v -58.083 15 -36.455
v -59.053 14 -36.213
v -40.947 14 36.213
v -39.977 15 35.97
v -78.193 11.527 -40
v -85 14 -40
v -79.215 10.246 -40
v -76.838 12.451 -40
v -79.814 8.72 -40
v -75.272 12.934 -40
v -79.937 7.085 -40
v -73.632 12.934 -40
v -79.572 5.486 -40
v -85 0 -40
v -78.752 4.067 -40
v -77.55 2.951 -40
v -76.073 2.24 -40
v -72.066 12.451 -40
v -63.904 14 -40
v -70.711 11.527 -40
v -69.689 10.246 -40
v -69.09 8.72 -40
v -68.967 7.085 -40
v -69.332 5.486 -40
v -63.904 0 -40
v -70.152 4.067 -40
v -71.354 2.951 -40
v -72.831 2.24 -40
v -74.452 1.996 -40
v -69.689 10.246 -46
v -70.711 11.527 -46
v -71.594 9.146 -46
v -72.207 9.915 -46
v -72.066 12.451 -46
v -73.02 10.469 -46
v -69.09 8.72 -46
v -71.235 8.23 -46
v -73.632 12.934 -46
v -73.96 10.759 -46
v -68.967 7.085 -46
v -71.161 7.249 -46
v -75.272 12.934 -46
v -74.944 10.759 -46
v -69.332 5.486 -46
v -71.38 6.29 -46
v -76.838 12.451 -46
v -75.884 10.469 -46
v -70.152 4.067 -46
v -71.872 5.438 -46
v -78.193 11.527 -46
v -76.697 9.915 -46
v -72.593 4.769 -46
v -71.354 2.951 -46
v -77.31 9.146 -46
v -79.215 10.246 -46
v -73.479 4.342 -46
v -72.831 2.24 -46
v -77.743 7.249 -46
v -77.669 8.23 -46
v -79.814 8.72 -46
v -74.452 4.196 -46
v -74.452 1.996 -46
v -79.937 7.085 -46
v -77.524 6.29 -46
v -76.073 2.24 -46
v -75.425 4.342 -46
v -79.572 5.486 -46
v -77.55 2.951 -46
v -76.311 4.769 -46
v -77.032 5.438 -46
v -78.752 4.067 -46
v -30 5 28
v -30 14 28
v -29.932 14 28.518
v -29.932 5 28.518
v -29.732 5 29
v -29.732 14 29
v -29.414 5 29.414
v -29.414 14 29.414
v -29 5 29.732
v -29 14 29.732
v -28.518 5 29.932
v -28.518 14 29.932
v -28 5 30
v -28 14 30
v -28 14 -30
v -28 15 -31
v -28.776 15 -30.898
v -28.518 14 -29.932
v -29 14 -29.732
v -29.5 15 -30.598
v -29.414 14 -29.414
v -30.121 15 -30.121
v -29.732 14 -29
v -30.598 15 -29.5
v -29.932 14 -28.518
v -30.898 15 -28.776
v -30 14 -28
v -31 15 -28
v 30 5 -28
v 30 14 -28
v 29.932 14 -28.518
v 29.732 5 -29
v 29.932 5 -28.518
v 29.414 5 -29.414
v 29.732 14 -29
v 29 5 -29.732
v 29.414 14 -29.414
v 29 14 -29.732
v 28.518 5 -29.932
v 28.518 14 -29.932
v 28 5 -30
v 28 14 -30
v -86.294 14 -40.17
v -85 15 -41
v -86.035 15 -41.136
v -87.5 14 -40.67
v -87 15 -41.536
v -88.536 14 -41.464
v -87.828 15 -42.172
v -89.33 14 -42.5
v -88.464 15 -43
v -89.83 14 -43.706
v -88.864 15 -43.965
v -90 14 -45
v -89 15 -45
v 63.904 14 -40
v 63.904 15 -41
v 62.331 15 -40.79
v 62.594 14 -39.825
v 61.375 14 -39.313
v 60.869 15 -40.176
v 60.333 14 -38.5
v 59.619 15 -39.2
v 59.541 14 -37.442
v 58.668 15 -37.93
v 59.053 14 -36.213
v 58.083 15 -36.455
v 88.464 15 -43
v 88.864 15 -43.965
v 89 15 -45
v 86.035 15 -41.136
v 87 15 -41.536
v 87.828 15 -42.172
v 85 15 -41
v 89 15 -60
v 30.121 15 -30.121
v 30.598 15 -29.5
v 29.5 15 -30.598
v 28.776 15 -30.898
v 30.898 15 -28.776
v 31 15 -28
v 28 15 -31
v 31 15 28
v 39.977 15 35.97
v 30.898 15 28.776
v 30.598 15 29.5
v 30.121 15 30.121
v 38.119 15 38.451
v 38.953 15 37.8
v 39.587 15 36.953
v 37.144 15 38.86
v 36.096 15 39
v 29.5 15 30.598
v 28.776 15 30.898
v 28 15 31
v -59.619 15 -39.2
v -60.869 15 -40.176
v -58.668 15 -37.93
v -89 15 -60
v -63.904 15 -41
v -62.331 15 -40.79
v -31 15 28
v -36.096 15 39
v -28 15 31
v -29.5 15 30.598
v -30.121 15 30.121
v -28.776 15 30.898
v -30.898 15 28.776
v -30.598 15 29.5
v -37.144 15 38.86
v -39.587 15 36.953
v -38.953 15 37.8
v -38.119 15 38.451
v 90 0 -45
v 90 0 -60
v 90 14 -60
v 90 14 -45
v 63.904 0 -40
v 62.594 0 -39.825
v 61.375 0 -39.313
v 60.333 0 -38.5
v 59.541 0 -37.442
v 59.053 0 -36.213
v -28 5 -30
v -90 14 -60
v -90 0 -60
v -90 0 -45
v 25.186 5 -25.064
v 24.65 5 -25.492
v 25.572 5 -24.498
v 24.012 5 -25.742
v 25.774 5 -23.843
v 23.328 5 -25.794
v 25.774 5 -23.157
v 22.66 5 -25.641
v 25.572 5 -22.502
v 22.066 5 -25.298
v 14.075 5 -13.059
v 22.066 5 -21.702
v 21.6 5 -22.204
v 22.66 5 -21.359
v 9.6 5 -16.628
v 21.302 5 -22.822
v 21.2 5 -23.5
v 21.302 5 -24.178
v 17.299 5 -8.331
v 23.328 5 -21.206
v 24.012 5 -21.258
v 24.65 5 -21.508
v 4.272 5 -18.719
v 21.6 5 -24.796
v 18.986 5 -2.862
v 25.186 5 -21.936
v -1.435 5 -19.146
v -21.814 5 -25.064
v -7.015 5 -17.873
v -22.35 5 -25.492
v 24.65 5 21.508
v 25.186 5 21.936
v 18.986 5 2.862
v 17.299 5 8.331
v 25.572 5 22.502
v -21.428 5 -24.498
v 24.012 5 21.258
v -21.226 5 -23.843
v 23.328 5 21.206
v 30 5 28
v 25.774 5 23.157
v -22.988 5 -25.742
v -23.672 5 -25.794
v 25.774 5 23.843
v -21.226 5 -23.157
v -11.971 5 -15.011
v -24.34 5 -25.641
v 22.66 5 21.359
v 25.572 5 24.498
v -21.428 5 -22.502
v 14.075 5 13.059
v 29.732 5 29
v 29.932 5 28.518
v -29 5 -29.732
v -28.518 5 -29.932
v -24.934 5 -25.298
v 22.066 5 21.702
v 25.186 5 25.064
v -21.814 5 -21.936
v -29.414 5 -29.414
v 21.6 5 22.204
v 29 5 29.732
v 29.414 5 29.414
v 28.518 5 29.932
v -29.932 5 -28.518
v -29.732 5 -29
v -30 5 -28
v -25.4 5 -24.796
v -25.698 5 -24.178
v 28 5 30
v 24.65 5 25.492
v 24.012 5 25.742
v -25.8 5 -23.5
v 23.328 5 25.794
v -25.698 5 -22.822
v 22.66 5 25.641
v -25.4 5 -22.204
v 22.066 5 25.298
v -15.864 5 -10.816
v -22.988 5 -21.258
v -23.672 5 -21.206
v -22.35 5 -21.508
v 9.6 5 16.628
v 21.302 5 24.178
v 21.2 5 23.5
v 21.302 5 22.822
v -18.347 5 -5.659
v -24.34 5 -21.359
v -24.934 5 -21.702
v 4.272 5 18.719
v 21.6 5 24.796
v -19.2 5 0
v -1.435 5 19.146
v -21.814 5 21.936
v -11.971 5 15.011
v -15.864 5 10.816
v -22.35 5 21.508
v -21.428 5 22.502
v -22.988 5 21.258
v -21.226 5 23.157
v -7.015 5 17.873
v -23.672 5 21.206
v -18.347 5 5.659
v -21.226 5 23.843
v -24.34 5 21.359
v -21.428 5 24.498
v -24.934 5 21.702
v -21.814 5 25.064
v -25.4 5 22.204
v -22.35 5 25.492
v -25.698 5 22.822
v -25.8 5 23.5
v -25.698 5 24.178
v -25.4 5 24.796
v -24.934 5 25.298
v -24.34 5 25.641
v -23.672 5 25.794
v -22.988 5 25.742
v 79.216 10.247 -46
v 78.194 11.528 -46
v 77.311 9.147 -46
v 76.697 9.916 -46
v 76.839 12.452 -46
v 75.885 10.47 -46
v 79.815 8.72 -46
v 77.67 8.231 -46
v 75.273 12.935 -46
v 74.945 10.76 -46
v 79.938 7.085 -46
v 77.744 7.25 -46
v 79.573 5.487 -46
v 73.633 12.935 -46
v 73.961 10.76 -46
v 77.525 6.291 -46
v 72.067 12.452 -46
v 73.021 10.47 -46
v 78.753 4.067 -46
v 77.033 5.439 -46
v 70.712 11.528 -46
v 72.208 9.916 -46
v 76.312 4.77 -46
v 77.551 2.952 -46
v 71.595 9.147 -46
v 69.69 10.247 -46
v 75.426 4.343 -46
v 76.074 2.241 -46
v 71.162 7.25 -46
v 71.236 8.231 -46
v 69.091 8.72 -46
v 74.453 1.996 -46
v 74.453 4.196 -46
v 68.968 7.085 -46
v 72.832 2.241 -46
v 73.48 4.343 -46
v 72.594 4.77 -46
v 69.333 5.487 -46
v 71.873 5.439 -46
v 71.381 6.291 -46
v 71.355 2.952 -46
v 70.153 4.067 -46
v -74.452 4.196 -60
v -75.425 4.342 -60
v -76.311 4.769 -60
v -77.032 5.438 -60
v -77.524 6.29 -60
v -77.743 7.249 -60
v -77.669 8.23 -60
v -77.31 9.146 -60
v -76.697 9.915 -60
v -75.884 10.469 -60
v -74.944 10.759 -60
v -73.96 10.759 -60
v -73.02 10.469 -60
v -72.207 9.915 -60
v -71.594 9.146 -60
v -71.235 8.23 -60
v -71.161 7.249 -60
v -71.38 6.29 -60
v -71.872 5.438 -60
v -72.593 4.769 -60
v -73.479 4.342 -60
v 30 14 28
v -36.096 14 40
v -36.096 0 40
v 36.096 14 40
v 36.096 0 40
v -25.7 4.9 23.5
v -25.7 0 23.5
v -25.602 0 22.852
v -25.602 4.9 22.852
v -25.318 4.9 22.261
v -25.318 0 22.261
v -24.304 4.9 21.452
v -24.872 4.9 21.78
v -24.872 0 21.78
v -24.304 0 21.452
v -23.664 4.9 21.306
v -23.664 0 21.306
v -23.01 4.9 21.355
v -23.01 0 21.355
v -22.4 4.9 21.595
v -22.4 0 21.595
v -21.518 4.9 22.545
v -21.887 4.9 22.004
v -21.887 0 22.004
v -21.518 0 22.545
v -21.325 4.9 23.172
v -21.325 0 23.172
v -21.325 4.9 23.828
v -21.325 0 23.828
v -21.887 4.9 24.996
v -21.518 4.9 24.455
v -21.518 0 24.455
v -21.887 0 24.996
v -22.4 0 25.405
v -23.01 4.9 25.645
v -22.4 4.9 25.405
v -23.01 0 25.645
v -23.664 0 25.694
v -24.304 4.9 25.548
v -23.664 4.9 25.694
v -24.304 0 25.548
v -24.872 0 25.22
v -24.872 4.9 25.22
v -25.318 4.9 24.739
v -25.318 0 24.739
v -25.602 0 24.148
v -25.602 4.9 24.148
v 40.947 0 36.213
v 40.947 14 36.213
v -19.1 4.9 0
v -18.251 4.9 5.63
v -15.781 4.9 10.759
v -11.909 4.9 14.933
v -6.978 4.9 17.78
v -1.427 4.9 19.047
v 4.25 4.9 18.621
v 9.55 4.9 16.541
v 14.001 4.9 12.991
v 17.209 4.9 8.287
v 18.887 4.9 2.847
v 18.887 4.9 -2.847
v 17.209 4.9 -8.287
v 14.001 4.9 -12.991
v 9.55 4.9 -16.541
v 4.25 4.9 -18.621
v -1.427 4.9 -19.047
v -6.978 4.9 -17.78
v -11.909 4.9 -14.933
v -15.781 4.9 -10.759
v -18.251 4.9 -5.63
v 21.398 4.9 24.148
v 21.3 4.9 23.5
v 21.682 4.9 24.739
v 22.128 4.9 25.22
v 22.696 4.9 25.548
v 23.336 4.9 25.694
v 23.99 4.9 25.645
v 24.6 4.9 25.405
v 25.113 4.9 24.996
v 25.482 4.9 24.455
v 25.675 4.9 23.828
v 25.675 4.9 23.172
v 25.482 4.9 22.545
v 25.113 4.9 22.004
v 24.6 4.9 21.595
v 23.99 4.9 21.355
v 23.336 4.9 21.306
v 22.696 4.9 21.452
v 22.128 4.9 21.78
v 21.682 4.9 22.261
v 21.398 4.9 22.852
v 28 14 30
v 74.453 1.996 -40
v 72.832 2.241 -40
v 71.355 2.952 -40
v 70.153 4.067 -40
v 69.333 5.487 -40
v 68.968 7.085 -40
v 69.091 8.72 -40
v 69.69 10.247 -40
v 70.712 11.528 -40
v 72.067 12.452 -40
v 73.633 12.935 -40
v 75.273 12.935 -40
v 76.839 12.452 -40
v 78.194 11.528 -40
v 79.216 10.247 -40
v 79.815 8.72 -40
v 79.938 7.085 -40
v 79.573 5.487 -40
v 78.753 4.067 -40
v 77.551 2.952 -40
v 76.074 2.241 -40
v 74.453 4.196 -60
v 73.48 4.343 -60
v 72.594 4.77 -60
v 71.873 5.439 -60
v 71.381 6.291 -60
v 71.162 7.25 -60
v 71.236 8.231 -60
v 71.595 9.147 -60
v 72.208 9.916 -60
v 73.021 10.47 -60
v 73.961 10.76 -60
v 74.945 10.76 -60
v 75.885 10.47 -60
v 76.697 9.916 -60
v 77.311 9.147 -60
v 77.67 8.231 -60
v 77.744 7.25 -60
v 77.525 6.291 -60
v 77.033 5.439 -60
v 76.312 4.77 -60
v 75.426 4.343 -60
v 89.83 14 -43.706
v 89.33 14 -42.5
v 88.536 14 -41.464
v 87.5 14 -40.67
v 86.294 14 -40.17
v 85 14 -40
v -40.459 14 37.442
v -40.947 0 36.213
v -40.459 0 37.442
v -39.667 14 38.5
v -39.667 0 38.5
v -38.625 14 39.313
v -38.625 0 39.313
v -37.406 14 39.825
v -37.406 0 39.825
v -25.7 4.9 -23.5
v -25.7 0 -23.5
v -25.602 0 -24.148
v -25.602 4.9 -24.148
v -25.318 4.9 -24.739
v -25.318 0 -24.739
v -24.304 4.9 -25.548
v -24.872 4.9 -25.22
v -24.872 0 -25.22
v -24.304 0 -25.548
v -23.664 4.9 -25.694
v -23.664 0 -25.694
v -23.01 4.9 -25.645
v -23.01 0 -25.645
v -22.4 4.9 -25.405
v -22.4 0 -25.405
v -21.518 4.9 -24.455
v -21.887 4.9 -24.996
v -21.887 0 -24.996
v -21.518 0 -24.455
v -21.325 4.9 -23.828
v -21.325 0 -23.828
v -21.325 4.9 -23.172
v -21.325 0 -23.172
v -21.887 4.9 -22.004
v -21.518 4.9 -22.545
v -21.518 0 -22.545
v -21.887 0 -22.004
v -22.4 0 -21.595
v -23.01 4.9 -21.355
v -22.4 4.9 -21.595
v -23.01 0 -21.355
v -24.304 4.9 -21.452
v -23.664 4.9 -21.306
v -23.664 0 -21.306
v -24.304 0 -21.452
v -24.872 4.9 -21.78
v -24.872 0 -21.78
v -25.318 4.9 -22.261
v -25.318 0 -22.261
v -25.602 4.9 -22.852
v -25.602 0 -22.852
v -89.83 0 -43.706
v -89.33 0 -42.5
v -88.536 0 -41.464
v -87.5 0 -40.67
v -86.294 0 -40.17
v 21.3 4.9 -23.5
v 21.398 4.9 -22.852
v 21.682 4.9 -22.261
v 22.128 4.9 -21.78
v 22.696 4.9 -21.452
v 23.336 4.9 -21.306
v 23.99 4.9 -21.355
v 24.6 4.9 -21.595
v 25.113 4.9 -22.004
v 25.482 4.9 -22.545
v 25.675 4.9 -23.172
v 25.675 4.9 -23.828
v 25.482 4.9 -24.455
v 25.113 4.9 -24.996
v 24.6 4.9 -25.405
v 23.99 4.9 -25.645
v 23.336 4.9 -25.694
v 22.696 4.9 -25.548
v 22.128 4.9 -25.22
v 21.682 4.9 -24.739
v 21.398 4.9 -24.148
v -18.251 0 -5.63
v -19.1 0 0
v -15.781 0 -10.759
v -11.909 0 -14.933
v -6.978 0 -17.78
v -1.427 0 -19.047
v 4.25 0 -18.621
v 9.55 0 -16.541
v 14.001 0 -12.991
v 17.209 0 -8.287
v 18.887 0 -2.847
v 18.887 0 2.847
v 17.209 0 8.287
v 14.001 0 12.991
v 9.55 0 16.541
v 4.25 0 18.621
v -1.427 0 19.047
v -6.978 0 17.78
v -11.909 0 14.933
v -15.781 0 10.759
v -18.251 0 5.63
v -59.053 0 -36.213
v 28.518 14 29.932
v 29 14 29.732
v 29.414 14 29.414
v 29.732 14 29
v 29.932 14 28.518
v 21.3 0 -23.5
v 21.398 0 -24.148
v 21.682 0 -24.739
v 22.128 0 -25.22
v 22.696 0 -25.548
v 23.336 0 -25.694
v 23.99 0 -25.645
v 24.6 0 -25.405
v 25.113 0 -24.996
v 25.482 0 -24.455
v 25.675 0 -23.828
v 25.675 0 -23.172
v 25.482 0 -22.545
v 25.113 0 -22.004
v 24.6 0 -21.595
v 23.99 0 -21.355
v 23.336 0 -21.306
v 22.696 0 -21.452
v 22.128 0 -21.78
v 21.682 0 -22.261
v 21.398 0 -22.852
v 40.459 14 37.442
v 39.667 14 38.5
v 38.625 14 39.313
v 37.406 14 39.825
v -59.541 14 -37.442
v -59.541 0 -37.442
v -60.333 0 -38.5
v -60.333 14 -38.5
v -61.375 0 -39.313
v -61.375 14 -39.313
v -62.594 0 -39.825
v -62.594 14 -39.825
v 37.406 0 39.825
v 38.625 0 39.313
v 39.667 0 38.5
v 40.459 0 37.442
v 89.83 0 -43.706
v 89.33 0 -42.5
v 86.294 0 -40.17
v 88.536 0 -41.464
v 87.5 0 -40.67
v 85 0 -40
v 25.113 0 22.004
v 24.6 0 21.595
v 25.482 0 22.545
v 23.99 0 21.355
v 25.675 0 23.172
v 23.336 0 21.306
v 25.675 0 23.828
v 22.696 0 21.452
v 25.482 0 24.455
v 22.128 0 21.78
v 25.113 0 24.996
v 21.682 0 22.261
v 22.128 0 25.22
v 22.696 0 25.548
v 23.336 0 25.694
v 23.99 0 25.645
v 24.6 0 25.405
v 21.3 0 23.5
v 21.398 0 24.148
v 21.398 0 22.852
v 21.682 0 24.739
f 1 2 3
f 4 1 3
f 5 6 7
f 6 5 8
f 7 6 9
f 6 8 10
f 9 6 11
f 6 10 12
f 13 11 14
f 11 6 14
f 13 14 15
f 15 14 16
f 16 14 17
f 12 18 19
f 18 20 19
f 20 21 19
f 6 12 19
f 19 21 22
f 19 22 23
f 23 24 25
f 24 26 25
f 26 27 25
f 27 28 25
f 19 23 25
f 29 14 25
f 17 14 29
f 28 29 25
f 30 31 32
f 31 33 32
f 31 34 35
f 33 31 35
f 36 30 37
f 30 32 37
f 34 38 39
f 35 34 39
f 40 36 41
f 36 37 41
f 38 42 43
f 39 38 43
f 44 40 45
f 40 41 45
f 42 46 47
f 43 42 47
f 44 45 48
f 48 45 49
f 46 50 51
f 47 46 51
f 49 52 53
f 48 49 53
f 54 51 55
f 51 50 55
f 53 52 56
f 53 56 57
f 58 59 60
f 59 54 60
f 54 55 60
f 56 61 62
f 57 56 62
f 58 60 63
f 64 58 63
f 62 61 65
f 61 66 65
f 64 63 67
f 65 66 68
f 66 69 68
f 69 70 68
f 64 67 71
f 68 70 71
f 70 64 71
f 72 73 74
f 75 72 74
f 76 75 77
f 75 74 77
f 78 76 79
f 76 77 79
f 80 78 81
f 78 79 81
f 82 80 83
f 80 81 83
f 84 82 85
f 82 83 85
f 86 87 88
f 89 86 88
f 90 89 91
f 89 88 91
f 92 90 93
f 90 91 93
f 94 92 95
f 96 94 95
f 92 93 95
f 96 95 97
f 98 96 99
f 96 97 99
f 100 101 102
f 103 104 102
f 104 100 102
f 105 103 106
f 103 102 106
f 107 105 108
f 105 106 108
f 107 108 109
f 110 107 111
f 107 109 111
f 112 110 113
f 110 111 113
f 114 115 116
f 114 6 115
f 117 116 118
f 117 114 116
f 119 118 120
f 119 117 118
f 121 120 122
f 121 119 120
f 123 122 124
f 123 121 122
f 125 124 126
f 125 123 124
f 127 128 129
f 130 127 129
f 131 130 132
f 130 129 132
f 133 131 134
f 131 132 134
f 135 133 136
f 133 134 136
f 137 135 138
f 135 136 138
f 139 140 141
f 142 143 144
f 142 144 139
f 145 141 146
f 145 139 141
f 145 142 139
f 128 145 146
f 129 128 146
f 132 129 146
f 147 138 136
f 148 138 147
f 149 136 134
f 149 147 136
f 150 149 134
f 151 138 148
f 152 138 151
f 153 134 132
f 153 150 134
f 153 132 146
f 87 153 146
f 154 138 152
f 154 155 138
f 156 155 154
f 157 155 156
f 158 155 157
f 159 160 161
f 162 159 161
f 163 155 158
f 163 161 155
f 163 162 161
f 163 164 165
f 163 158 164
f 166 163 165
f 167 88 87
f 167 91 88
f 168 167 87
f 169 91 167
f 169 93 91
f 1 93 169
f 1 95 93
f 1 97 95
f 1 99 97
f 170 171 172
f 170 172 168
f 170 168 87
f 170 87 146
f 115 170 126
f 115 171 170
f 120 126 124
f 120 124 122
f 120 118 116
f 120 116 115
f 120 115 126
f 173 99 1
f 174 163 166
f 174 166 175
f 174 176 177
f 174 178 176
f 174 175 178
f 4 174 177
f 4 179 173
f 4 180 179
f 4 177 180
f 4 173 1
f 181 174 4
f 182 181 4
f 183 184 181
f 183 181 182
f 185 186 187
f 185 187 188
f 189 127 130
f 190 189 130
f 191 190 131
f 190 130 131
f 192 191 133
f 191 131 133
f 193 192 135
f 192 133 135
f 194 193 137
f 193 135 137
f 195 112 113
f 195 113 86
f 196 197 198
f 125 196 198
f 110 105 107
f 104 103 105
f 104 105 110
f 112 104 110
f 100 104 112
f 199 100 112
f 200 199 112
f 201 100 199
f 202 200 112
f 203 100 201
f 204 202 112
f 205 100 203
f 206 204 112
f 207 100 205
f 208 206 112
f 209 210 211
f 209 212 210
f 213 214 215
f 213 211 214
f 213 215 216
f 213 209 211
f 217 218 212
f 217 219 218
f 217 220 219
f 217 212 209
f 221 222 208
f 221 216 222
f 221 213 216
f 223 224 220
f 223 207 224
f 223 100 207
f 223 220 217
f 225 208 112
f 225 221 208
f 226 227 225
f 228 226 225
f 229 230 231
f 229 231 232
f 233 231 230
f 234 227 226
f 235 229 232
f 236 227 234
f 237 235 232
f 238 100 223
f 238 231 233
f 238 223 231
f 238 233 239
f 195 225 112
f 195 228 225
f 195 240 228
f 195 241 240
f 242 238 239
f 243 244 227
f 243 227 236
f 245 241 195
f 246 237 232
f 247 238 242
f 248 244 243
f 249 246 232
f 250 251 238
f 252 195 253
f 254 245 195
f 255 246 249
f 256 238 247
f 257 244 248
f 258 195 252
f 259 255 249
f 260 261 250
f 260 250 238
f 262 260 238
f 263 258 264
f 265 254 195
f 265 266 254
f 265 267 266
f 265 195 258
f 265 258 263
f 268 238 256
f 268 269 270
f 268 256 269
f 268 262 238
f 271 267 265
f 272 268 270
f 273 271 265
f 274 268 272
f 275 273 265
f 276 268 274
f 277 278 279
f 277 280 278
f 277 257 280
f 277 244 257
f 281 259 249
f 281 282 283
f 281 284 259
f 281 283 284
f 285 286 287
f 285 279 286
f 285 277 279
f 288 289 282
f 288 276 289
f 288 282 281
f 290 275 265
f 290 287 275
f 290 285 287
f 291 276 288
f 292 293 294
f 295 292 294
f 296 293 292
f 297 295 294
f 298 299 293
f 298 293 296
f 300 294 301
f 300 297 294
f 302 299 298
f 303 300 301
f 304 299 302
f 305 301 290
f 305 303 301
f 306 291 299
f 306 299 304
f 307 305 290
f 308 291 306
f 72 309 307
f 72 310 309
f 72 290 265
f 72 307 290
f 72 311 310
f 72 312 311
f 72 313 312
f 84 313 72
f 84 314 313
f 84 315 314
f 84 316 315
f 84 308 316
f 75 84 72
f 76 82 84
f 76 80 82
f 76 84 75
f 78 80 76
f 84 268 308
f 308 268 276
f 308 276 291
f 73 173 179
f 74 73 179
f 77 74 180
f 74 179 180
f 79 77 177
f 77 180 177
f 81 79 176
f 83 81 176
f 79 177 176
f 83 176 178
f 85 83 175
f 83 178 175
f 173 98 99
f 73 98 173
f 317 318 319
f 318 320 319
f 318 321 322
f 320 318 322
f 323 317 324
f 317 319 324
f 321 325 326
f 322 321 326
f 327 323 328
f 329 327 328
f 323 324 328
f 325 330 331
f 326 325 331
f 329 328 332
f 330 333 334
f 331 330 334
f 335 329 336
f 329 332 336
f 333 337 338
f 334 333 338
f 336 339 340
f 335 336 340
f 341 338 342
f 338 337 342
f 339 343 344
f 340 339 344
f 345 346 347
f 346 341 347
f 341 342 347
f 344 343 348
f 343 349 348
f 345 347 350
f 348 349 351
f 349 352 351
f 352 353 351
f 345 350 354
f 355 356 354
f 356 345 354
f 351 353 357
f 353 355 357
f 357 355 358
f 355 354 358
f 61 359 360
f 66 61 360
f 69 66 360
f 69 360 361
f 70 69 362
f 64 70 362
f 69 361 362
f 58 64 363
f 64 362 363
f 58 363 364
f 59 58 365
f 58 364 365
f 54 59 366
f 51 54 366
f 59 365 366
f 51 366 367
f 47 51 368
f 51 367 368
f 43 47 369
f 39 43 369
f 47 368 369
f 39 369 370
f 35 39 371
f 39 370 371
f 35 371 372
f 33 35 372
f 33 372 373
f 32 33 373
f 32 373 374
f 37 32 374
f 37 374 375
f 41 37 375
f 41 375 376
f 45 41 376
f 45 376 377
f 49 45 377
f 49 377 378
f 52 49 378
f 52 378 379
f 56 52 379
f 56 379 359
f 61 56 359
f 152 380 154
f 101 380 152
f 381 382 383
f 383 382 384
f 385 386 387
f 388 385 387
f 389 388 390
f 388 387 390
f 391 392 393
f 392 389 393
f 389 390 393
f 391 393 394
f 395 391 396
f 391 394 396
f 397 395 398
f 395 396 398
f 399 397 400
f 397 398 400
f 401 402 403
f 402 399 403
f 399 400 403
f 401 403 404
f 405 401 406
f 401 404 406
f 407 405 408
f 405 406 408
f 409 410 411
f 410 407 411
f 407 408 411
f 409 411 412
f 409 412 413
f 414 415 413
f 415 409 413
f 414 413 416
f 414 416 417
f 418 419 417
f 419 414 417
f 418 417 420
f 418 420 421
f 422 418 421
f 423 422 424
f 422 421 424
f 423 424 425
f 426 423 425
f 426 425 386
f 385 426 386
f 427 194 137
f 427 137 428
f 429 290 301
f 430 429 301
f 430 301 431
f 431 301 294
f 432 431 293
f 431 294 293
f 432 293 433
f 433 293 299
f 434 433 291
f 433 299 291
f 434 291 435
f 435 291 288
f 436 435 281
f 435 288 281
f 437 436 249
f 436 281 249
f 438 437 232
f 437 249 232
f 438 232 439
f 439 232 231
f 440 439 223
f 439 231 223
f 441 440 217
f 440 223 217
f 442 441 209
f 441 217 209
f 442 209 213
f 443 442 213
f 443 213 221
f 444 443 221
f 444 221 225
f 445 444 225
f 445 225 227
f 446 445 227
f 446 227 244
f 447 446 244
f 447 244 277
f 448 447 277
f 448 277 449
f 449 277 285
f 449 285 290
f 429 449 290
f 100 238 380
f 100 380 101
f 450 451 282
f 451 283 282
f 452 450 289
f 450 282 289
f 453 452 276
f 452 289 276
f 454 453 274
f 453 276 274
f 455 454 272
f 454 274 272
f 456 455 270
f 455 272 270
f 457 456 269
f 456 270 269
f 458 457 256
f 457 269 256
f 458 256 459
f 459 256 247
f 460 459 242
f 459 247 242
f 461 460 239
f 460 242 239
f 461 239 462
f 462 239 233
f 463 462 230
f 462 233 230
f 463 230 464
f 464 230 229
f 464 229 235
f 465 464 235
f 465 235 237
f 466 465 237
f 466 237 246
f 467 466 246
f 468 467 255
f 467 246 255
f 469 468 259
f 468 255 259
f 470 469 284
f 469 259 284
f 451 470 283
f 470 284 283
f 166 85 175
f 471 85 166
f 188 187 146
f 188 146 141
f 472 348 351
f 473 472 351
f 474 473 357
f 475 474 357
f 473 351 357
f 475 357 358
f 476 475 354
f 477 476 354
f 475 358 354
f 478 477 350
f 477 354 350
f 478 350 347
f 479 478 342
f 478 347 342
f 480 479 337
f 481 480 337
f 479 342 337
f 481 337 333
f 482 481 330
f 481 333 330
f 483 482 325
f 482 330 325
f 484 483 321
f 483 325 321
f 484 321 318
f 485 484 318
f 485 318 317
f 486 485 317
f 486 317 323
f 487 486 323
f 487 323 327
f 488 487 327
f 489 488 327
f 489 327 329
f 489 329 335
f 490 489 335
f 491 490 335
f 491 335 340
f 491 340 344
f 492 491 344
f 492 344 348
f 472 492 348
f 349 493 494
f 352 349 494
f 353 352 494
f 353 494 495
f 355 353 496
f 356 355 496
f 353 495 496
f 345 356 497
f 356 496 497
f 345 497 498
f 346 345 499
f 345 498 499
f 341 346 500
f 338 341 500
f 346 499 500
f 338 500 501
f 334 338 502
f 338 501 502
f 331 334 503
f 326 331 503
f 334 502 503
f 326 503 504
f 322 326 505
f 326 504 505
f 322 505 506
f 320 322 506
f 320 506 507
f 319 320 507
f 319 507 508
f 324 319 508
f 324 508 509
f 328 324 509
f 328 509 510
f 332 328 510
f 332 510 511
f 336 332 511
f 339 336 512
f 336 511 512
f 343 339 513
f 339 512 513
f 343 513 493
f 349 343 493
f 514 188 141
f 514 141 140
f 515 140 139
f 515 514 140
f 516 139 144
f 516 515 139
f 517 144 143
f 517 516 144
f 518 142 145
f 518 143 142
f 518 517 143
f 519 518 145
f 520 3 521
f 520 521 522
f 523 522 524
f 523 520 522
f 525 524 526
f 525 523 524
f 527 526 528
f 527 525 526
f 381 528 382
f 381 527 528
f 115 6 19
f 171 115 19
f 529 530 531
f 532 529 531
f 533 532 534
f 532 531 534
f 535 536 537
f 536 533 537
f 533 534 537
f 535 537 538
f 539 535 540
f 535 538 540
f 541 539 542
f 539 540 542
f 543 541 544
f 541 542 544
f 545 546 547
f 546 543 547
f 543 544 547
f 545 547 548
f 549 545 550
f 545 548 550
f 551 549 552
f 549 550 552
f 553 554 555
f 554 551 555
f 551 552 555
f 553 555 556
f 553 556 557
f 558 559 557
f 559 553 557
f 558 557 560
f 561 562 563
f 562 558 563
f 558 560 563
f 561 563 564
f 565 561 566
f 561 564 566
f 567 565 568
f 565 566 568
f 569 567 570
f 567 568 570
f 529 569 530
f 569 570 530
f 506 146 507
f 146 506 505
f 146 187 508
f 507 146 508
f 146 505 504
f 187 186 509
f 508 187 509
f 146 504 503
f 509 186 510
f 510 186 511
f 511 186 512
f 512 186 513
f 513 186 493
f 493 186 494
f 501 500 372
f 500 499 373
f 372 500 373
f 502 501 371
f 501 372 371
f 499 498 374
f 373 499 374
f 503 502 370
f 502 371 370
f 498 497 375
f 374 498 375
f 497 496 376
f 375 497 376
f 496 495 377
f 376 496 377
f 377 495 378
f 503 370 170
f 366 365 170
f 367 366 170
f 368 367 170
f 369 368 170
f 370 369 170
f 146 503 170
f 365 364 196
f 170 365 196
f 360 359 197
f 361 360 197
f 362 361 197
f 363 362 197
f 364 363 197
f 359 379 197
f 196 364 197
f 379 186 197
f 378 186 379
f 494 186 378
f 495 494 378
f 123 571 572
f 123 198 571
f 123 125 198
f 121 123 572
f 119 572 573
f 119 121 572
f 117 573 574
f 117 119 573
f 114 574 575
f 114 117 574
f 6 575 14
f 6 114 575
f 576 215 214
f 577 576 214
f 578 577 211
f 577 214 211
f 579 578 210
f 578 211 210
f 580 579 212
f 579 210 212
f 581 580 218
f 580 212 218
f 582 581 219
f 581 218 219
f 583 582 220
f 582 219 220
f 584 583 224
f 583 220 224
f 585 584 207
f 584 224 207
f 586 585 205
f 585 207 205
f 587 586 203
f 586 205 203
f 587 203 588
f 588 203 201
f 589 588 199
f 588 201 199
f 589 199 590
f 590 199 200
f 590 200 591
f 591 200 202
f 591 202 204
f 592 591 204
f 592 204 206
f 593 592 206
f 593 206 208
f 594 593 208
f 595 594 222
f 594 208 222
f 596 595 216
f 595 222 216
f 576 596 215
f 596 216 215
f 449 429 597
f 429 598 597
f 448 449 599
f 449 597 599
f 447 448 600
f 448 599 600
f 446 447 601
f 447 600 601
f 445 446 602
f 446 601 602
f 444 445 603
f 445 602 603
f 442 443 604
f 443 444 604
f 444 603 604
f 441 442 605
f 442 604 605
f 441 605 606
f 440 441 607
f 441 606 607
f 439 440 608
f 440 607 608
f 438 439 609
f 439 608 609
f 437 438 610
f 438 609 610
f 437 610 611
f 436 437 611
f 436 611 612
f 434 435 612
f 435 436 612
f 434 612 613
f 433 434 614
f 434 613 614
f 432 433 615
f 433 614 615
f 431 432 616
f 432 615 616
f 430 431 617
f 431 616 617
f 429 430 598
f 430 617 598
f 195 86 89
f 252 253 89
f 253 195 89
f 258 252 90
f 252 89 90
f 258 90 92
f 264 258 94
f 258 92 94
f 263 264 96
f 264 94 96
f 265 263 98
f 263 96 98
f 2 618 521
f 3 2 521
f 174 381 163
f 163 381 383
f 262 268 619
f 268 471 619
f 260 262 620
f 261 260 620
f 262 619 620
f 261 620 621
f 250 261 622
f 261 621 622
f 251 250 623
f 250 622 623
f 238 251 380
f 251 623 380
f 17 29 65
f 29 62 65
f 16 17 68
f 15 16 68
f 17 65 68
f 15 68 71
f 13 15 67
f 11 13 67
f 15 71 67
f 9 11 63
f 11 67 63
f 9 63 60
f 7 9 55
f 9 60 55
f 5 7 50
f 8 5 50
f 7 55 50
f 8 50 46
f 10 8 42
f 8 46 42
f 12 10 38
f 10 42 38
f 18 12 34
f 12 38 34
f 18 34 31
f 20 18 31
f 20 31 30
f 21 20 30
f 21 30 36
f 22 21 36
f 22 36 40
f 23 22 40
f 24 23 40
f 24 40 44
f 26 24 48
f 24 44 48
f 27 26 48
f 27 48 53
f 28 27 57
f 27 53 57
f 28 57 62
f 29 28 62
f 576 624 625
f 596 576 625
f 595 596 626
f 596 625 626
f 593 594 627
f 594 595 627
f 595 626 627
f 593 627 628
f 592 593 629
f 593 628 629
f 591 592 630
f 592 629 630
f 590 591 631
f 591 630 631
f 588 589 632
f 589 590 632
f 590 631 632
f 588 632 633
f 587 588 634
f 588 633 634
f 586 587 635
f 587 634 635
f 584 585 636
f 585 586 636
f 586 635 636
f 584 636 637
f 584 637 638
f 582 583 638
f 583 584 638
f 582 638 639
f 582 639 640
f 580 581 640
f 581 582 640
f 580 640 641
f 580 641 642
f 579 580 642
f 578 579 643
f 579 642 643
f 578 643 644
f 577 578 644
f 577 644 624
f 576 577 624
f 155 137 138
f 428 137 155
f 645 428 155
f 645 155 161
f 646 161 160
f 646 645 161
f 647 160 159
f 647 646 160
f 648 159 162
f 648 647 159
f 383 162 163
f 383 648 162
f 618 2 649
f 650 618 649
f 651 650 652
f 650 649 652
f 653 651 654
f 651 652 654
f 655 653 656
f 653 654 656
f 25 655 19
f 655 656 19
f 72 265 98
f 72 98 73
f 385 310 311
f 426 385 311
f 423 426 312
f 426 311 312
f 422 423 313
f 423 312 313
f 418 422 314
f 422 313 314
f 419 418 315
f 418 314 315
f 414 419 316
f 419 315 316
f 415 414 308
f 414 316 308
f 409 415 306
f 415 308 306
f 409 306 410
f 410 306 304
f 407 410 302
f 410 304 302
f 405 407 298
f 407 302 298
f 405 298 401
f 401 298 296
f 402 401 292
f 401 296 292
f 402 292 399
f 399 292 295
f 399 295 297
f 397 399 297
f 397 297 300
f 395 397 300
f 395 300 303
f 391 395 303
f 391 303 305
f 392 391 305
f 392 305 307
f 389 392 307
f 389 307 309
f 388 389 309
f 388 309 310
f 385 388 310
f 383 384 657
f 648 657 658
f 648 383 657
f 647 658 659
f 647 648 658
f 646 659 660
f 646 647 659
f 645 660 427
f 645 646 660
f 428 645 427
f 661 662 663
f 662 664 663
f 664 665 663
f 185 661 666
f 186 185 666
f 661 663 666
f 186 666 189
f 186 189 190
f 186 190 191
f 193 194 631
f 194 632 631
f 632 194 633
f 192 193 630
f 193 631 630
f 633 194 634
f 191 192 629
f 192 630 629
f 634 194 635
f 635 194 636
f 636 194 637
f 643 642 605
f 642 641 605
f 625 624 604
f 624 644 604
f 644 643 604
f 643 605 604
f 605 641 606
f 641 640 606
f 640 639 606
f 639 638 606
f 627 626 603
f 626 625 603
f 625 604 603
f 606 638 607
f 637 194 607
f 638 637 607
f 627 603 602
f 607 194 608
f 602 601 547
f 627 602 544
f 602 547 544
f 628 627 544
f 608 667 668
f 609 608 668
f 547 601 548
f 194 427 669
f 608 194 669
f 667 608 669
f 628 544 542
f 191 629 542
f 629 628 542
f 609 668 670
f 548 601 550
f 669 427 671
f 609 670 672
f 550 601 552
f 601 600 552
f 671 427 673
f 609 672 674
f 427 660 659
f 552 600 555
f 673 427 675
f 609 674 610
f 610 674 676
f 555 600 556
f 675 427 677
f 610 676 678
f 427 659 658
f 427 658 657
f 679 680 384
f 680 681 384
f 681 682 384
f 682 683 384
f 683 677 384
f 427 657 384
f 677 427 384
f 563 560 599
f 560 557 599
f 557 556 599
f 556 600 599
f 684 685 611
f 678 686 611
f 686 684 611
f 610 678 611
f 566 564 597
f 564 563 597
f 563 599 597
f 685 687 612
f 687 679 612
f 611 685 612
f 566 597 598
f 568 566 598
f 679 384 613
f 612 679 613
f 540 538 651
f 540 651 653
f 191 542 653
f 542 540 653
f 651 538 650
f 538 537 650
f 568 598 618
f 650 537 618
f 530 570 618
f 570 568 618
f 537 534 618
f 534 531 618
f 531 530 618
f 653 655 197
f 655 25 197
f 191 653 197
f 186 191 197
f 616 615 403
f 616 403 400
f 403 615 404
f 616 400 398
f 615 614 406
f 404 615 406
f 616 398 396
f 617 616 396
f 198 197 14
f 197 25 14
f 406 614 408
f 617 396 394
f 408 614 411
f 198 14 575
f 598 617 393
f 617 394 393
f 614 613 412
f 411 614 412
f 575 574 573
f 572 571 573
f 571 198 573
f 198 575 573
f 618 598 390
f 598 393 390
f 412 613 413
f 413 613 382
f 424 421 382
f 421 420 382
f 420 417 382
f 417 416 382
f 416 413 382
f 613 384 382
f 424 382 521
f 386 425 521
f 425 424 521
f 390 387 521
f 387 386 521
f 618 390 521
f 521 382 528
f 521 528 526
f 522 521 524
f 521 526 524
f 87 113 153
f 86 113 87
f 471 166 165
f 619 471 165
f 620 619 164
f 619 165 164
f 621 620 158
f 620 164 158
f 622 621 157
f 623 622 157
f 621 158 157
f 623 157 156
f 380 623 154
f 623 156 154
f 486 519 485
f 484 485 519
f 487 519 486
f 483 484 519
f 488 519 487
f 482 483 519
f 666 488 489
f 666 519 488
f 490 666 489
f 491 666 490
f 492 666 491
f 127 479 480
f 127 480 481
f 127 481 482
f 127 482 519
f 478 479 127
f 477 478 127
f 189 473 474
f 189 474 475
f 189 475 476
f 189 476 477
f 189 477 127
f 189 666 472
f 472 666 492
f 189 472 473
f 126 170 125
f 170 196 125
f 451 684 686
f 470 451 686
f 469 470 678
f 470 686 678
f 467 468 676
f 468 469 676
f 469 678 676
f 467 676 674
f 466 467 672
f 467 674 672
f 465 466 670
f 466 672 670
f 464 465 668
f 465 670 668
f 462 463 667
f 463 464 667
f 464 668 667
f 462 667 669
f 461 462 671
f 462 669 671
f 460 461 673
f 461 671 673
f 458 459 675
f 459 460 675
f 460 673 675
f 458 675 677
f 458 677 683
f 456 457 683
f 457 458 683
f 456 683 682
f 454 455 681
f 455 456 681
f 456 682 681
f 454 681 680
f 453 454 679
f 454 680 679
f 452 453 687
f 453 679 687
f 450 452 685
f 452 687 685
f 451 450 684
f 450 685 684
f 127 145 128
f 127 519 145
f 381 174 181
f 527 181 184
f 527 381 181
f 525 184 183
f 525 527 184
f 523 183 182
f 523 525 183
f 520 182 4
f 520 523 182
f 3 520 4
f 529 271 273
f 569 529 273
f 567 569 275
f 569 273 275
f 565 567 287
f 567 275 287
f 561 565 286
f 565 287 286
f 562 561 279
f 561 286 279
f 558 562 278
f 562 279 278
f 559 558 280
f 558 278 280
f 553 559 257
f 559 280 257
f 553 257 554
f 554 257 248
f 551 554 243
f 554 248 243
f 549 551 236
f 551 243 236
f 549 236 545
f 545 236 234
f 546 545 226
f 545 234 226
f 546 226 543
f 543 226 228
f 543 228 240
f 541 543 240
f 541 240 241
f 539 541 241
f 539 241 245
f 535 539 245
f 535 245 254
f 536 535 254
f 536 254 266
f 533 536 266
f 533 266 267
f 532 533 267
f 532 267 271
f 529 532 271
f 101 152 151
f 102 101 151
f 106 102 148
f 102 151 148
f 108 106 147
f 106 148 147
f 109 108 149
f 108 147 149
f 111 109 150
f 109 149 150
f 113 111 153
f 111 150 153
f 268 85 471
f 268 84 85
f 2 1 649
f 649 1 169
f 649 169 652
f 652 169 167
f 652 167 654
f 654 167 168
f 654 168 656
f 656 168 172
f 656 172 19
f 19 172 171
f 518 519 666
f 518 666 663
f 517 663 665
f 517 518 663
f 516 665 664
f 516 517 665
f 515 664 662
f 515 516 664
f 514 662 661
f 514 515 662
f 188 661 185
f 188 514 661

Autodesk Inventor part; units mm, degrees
ref_plane "YZ Plane" through (0, 0, 0) normal (1, 0, 0) x (0, 1, 0)
ref_plane "XZ Plane" through (0, 0, 0) normal (0, 1, 0) x (-1, 0, 0)
ref_plane "XY Plane" through (0, 0, 0) normal (0, 0, 1) x (1, 0, 0)
sketch "Skizze1" plane through (0, 0, 0) normal (0, 1, 0) x (-1, 0, 0)
  circle A0 centre (0, 0) radius 19.1
  line L0 (23.5, 23.5) -> (-23.5, 23.5) construction
  line L1 (-23.5, 23.5) -> (-23.5, -23.5) construction
  line L2 (-23.5, -23.5) -> (23.5, -23.5) construction
  line L3 (23.5, -23.5) -> (23.5, 23.5) construction
  line L4 (23.5, 23.5) -> (-23.5, -23.5) construction
  line L5 (-23.5, 23.5) -> (23.5, -23.5) construction
  circle A1 centre (23.5, 23.5) radius 2.2
  circle A2 centre (23.5, -23.5) radius 2.2
  circle A3 centre (-23.5, -23.5) radius 2.2
  circle A4 centre (-23.5, 23.5) radius 2.2
  line L6 (30, 30) -> (-30, 30)
  line L7 (-30, 30) -> (-30, -30)
  line L8 (-30, -30) -> (30, -30)
  line L9 (30, -30) -> (30, 30)
  line L10 (30, 30) -> (-30, -30) construction
  line L11 (-30, 30) -> (30, -30) construction
  line L12 (40, 40) -> (-40, 40)
  line L13 (-40, 40) -> (-40, -40) construction
  line L14 (-40, -40) -> (40, -40) construction
  line L15 (40, -40) -> (40, 40) construction
  line L16 (40, 40) -> (-40, -40) construction
  line L17 (-40, 40) -> (40, -40) construction
  line L18 (0, -40) -> (0, -60) construction
  line L19 (0, -40) -> (20, -40) construction
  line L20 (0, -60) -> (-90, -60)
  line L21 (-90, -60) -> (-90, -40)
  line L22 (-90, -40) -> (-60, -40)
  line L23 (-60, -40) -> (-40, 40)
  line L24 (0, -60) -> (90, -60)
  line L25 (0, -60) -> (90, -60) construction
  line L26 (90, -60) -> (90, -40)
  line L27 (90, -40) -> (60, -40)
  line L28 (60, -40) -> (40, 40)
  dimension "d0" = 38.2
  dimension "d1" = 47
  dimension "d2" = 47
  dimension "d3" = 4.4
  dimension "d4" = 4.4
  dimension "d5" = 4.4
  dimension "d6" = 4.4
  dimension "d7" = 60
  dimension "d8" = 60
  dimension "d9" = 80
  dimension "d10" = 80
  dimension "d11" = 20
  dimension "d12" = 90
  dimension "d13" = 90
  dimension "d14" = 20
  dimension "d15" = 30
  dimension "d16" = 90
  dimension "d17" = 0
  dimension "d18" = 20
  dimension "d19" = 30
extrude "Extrusion1" add sketch "Skizze1" along normal blind 5 contours L9 L8 L7 L6
extrude "Extrusion2" add sketch "Skizze1" along normal blind 15 contours L28 L27 L26 L24 L20 L21 L22 L23 L12
fillet "Rundung1" radius 5 6 edges at (-90, 7.5, -40) (-60, 7.5, -40) (60, 7.5, -40) (90, 7.5, -40) (40, 7.5, 40) (-40, 7.5, 40)
fillet "Rundung2" radius 2 4 edges at (-30, 10, -30) (30, 10, -30) (30, 10, 30) (-30, 10, 30)
chamfer "Fase1" distance 1 angle 45 21 edges at (-74.4519, 15, -40) (-60.8268, 15, -38.941) (-50, 15, 0) (-39.1732, 15, 38.941) (0, 15, 40) (39.1732, 15, 38.941) (50, 15, 0) (60.8268, 15, -38.941) (74.4519, 15, -40) (88.5355, 15, -41.4645) (90, 15, -52.5) (-88.5355, 15, -41.4645) (-90, 15, -52.5) (-30, 15, 0) (-29.4142, 15, -29.4142) (0, 15, -30) (29.4142, 15, -29.4142) (30, 15, 0) (29.4142, 15, 29.4142) (0, 15, 30) (-29.4142, 15, 29.4142)
chamfer "Fase2" distance 0.1 angle 45 5 edges at (-21.3, 5, -23.5) (25.7, 5, -23.5) (19.1, 5, 0) (25.7, 5, 23.5) (-21.3, 5, 23.5)
thread "Gewinde1" size "M5x0.8" class "6H" standard "ANSI Metric M Profile" full length
thread "Gewinde2" size "M5x0.8" class "6H" standard "ANSI Metric M Profile" full length
sketch "Skizze2" plane through (-85, 0, -40) normal (0, 0, 1) x (1, 0, 0)
  line L0 (0, 0) -> (0, 14) construction
  line L1 (0, 14) -> (0, 15) construction
  line L2 (21.0961, 15) -> (0, 15) construction
  line L3 (21.0961, 14) -> (21.0961, 15) construction
  line L4 (21.0961, 14) -> (21.0961, 0) construction
  line L5 (0, 0) -> (21.0961, 0) construction
  line L6 (148.9039, 0) -> (148.9039, 14) construction
  line L7 (148.9039, 14) -> (148.9039, 15) construction
  line L8 (170, 15) -> (148.9039, 15) construction
  line L9 (170, 14) -> (170, 15) construction
  line L10 (170, 14) -> (170, 0) construction
  line L11 (148.9039, 0) -> (170, 0) construction
  line L12 (0, 15) -> (21.0961, 0)
  line L13 (21.0961, 15) -> (0, 0)
  line L14 (175, 0) -> (170, 0) construction
  line L15 (148.9039, 15) -> (170, 0)
  line L16 (170, 15) -> (148.9039, 0)
  point P0 (85, 0)
sketch "Skizze3" plane through (-85, 0, -40) normal (0, 0, 1) x (1, 0, 0)
  point P0 (85, 0)
  point P1 (10.548, 7.4957)
  point P2 (159.4529, 7.4965)
hole "Bohrung1" at (-74.452, 7.4957, -40) at (74.4529, 7.4965, -40) direction (0, 0, -1) diameter 6.6 end through all counterbore diameter 11 counterbore depth 6 clearance for "Innensechskantkopfschraube" size "M6" standard "ANSI Metrisches M Profil"
properties part number "Y-Motorhalter" material "Aluminium 6061"
